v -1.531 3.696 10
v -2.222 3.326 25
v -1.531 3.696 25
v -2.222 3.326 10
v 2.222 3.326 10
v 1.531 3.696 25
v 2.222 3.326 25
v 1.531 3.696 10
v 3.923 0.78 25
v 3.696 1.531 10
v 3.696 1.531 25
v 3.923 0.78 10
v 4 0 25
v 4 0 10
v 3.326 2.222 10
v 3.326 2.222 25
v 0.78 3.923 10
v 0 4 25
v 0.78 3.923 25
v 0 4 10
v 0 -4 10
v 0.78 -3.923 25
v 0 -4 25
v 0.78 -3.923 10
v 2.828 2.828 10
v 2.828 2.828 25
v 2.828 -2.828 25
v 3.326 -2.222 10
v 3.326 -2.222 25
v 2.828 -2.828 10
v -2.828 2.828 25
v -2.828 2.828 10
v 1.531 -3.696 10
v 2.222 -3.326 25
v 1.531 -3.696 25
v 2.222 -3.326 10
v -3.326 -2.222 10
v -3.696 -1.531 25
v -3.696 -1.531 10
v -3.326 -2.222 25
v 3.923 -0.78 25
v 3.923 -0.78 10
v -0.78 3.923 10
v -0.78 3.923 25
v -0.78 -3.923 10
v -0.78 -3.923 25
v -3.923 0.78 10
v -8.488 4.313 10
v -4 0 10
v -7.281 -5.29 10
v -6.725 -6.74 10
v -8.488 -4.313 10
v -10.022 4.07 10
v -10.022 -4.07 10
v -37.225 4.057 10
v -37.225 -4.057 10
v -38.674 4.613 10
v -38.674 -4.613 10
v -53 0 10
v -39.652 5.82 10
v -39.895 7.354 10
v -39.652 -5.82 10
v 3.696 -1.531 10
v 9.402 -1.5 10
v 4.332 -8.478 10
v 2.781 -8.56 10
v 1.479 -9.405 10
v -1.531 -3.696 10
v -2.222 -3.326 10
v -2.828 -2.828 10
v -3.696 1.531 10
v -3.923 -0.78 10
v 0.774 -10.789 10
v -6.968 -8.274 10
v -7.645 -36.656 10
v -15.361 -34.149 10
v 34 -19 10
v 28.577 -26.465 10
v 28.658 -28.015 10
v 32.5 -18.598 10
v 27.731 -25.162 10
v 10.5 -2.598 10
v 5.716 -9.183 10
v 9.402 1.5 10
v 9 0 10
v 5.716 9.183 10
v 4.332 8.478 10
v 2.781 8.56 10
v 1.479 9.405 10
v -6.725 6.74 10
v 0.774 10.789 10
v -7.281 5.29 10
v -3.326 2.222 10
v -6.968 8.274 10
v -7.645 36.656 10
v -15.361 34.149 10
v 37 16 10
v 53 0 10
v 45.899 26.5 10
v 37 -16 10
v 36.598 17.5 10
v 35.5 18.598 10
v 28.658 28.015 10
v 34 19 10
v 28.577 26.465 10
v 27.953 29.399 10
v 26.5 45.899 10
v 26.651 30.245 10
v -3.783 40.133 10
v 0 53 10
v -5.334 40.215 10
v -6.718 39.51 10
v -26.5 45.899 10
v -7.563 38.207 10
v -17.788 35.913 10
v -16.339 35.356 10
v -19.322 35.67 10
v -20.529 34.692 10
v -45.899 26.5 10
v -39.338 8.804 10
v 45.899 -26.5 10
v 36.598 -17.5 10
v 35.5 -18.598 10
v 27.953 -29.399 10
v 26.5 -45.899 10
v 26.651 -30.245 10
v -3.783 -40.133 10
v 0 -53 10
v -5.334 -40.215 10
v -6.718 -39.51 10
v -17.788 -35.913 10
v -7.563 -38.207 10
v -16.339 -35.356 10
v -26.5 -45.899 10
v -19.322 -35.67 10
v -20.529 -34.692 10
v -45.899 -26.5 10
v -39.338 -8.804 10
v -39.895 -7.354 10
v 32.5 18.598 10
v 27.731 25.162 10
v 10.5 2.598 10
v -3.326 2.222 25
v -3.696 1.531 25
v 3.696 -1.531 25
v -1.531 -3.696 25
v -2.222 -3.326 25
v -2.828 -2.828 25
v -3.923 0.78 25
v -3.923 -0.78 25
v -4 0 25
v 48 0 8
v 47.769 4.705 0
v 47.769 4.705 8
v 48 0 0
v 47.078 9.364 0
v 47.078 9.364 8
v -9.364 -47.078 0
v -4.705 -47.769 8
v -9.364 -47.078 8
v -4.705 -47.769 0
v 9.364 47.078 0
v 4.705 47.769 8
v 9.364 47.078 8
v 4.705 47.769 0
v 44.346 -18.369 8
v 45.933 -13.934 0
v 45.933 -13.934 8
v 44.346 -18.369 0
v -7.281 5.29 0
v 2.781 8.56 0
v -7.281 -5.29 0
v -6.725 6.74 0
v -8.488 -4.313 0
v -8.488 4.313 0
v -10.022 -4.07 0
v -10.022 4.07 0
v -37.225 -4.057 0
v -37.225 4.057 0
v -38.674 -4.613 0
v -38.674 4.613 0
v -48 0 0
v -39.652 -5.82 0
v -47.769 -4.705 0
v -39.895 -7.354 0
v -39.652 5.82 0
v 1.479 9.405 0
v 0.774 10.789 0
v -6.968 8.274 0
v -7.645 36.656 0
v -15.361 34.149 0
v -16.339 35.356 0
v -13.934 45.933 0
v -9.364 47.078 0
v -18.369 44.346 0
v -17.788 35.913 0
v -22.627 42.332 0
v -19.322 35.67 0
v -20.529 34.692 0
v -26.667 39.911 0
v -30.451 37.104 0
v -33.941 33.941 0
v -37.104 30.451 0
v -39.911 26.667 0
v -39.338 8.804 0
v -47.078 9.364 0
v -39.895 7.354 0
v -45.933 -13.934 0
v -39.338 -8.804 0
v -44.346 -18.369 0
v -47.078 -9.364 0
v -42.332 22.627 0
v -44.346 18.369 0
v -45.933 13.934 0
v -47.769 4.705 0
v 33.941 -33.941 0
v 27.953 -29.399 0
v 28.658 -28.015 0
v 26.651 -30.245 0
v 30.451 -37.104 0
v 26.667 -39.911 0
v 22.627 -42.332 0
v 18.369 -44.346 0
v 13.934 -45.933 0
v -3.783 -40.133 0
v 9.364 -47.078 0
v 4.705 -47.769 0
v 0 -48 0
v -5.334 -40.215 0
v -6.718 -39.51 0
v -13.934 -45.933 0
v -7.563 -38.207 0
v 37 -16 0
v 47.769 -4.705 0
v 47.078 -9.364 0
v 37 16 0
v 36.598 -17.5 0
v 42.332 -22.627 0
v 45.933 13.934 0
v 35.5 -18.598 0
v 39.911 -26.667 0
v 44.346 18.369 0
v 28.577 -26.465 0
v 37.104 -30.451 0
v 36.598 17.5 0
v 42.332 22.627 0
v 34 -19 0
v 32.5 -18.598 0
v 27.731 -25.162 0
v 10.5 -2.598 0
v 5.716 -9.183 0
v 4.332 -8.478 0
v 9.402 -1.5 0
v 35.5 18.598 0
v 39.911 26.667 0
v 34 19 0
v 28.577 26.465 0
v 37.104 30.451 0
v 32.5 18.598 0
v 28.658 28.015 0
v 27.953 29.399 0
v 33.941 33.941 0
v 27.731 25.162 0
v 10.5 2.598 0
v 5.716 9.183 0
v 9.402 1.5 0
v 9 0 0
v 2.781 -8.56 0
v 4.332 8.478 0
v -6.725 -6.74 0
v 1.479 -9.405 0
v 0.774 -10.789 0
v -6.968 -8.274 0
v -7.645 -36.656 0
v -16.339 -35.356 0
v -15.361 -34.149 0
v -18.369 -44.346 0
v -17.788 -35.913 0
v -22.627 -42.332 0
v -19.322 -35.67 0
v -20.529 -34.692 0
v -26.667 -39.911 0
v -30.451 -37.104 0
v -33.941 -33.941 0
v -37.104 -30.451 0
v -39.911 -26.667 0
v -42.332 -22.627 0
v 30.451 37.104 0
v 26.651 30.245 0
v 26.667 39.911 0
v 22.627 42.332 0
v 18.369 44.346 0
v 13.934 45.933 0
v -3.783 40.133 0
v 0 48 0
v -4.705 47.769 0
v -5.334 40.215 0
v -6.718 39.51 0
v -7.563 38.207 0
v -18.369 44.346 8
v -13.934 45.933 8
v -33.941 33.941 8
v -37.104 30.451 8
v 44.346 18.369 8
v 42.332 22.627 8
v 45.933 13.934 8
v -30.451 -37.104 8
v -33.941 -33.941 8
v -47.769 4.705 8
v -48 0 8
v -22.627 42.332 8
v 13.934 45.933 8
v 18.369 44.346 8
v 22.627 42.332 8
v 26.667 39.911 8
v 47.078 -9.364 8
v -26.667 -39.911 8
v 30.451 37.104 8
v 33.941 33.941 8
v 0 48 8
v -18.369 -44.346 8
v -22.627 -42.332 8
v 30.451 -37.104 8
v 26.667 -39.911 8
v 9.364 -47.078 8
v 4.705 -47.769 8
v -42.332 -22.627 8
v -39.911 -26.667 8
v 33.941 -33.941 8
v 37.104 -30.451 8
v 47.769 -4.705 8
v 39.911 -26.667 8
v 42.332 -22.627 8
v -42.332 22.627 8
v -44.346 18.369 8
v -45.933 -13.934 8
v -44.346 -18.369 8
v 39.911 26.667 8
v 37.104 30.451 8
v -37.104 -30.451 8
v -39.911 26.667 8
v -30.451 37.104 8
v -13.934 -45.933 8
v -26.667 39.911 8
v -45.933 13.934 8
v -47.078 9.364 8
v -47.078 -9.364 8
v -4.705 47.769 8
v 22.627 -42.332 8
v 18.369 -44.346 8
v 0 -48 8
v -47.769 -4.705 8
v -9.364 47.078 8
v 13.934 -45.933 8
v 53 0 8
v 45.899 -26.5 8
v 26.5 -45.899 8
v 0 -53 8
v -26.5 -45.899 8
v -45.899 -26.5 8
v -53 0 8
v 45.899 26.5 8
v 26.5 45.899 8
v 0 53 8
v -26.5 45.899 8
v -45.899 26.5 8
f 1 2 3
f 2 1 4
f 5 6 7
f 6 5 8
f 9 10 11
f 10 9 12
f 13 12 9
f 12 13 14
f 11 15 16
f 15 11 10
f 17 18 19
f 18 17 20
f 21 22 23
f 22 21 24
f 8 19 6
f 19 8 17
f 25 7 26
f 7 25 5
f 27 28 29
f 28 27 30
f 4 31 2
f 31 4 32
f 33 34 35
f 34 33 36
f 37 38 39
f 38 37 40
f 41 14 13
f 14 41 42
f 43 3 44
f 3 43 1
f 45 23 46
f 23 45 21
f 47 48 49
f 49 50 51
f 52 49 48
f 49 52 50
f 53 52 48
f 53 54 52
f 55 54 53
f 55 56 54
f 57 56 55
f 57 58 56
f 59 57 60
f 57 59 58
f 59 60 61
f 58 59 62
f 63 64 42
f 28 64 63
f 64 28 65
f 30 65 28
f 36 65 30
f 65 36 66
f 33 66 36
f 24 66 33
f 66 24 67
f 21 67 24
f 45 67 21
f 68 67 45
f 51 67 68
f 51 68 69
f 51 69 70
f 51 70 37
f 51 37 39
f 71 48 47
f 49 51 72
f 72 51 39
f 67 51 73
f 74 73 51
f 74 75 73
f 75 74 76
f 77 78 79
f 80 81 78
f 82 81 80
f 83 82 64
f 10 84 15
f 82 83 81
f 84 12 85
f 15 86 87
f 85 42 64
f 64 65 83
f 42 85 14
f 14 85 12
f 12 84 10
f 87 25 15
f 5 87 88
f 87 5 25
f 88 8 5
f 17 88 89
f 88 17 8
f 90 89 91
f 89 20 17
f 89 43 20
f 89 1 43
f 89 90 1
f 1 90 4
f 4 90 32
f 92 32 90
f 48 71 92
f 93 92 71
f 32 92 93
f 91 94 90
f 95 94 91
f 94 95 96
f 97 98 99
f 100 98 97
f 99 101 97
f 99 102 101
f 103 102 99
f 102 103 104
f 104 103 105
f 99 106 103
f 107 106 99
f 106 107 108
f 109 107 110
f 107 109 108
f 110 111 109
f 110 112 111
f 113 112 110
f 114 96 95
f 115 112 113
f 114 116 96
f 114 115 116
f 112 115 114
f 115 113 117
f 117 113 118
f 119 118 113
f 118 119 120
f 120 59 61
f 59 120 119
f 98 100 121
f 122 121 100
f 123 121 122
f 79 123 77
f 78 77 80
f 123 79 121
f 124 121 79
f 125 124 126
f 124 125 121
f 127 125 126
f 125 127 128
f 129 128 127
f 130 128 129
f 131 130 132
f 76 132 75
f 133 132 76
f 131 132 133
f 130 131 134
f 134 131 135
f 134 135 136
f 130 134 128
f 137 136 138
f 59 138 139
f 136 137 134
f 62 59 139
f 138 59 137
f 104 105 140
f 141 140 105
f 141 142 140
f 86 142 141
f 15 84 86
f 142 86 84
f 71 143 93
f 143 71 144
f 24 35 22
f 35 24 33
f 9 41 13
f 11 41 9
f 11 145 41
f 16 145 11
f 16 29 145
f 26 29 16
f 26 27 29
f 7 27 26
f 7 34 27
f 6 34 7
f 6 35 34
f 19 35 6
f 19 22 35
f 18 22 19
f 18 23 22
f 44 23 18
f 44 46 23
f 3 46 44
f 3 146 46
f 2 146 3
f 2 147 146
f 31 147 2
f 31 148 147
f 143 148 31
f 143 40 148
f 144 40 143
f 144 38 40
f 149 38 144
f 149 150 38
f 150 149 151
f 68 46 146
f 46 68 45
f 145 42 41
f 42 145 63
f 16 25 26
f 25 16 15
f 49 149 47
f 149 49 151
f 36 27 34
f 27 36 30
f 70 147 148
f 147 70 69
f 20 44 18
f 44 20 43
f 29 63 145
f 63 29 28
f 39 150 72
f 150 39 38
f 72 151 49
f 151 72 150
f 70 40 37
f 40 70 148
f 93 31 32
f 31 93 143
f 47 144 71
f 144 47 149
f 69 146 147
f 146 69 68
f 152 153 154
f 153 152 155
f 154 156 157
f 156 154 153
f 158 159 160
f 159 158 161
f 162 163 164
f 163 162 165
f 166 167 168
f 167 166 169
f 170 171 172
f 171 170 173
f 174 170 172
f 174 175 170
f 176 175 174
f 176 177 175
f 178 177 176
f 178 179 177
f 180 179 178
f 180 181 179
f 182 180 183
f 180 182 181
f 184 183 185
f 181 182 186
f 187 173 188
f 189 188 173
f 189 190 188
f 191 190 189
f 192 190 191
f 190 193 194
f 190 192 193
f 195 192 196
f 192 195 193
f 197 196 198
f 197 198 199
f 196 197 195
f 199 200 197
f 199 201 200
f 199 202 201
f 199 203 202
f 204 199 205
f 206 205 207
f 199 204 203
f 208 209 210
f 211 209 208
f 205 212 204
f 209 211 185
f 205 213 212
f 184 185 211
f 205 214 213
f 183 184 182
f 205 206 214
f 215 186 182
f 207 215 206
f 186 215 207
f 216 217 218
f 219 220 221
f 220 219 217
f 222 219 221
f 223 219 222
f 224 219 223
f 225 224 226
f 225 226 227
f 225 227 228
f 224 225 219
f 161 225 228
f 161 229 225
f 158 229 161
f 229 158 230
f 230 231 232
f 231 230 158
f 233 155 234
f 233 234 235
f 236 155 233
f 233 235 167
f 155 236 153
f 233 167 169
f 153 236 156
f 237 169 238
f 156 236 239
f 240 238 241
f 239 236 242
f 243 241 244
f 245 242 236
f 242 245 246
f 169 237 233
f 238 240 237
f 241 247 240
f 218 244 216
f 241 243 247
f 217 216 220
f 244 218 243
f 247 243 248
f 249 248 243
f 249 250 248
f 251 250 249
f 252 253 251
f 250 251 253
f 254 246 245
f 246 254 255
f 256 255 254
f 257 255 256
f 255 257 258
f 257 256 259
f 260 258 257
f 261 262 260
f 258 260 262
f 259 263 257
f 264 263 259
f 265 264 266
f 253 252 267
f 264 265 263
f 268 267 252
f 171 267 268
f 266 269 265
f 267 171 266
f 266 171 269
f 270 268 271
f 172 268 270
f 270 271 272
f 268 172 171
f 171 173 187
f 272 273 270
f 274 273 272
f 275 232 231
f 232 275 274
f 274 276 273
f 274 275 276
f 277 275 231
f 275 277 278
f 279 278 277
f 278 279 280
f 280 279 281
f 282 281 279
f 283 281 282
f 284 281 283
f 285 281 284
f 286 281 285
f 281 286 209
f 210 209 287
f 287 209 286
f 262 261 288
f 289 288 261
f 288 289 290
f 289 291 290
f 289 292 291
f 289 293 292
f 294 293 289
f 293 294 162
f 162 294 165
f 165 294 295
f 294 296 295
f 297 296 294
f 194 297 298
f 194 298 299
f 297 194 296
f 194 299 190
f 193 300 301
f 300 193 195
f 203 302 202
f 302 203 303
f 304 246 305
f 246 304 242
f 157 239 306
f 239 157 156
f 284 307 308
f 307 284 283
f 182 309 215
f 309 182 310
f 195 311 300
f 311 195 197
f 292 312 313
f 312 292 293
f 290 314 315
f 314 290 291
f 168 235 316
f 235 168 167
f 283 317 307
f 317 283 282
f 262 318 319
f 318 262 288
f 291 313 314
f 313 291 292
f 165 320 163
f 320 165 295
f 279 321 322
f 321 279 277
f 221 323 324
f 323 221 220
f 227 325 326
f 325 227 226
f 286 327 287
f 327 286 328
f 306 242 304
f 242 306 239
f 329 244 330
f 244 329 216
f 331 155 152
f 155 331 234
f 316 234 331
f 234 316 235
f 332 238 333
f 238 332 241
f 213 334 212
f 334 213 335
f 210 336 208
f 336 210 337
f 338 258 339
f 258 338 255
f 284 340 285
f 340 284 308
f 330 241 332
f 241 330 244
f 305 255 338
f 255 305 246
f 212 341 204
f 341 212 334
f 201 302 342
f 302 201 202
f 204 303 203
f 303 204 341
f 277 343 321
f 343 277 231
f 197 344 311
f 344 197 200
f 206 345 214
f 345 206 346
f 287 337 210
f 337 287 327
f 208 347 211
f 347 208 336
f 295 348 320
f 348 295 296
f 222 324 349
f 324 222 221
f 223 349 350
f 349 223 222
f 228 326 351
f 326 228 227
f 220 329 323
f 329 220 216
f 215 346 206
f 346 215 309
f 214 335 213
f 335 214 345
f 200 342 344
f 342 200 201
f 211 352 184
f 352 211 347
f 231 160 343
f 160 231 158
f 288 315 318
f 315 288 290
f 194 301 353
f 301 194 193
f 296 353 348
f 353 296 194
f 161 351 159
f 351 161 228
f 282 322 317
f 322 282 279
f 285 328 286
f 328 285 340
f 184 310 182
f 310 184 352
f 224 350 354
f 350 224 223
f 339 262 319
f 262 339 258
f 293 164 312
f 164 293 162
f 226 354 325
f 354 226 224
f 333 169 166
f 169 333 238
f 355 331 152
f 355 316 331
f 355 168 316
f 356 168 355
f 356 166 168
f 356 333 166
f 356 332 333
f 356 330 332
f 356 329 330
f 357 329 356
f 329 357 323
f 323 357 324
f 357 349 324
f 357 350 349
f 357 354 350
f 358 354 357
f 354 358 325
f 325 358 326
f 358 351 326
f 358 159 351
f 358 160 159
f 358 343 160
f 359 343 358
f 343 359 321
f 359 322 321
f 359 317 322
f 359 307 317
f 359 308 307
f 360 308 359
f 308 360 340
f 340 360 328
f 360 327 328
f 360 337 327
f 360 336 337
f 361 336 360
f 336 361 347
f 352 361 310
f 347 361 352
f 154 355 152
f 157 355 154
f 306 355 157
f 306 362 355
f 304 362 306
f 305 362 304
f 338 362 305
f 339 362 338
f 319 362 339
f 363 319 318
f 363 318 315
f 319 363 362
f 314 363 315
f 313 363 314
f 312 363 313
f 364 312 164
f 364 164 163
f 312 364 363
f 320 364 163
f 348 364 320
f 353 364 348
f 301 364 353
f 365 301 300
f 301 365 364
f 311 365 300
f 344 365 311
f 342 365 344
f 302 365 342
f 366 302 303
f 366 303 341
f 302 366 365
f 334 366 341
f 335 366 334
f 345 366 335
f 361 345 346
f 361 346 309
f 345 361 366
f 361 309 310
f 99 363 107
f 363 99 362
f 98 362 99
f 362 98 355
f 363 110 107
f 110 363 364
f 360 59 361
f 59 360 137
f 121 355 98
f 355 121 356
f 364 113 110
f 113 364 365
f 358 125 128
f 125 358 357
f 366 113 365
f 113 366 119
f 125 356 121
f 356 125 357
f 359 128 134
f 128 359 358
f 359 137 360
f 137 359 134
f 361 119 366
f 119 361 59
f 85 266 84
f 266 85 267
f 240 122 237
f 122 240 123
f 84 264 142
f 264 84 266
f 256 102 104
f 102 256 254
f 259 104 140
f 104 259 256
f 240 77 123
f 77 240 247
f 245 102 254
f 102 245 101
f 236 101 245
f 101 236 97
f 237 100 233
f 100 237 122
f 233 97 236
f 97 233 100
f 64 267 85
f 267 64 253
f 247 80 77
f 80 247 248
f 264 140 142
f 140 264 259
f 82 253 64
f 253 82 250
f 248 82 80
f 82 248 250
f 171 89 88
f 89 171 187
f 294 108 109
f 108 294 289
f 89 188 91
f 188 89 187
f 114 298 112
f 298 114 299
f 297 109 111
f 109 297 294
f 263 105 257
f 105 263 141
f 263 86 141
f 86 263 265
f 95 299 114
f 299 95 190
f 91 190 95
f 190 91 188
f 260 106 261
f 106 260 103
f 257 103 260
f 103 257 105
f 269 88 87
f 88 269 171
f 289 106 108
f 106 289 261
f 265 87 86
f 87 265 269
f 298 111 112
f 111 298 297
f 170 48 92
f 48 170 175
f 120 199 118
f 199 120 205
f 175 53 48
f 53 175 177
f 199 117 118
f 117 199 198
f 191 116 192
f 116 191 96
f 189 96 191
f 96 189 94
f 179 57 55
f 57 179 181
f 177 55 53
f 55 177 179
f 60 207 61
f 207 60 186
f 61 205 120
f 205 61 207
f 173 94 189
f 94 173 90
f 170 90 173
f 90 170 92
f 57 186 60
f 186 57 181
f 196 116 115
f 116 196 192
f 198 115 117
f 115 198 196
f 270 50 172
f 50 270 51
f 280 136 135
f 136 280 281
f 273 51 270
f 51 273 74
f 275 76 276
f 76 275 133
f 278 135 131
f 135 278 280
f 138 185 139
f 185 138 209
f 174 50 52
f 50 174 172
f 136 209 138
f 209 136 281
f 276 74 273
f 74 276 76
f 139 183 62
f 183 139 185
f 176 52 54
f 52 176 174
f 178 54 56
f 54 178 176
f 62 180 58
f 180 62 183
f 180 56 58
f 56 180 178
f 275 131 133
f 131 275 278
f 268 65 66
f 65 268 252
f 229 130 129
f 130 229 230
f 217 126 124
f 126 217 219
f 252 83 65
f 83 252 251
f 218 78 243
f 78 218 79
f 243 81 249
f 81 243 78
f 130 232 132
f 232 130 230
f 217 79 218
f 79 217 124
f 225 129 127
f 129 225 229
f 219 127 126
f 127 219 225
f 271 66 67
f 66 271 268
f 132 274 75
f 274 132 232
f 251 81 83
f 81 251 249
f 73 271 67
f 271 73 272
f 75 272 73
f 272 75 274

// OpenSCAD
$fn=12;
difference(){
union(){
translate([0,0,10]) cylinder(r1=4,r2=4,h=15,$fn=32);
cylinder(r1=48,r2=48,h=8,$fn=64);
translate([0,0,8])cylinder(r1=53,r2=53,h=2);
}

	hole();
	rotate([0,0,72])
		hole();
	rotate([0,0,2*72])
		hole();
	rotate([0,0,3*72])
		hole();
	rotate([0,0,4*72])
		hole();
}

module hole(){
	w=16;
	linear_extrude(h=16)
		translate([12,0,0])
			minkowski(){
				circle(r=3);
				polygon(points=[[0,0],[22,w],[22,-w]],path=[0,1,2]);
			}
}
